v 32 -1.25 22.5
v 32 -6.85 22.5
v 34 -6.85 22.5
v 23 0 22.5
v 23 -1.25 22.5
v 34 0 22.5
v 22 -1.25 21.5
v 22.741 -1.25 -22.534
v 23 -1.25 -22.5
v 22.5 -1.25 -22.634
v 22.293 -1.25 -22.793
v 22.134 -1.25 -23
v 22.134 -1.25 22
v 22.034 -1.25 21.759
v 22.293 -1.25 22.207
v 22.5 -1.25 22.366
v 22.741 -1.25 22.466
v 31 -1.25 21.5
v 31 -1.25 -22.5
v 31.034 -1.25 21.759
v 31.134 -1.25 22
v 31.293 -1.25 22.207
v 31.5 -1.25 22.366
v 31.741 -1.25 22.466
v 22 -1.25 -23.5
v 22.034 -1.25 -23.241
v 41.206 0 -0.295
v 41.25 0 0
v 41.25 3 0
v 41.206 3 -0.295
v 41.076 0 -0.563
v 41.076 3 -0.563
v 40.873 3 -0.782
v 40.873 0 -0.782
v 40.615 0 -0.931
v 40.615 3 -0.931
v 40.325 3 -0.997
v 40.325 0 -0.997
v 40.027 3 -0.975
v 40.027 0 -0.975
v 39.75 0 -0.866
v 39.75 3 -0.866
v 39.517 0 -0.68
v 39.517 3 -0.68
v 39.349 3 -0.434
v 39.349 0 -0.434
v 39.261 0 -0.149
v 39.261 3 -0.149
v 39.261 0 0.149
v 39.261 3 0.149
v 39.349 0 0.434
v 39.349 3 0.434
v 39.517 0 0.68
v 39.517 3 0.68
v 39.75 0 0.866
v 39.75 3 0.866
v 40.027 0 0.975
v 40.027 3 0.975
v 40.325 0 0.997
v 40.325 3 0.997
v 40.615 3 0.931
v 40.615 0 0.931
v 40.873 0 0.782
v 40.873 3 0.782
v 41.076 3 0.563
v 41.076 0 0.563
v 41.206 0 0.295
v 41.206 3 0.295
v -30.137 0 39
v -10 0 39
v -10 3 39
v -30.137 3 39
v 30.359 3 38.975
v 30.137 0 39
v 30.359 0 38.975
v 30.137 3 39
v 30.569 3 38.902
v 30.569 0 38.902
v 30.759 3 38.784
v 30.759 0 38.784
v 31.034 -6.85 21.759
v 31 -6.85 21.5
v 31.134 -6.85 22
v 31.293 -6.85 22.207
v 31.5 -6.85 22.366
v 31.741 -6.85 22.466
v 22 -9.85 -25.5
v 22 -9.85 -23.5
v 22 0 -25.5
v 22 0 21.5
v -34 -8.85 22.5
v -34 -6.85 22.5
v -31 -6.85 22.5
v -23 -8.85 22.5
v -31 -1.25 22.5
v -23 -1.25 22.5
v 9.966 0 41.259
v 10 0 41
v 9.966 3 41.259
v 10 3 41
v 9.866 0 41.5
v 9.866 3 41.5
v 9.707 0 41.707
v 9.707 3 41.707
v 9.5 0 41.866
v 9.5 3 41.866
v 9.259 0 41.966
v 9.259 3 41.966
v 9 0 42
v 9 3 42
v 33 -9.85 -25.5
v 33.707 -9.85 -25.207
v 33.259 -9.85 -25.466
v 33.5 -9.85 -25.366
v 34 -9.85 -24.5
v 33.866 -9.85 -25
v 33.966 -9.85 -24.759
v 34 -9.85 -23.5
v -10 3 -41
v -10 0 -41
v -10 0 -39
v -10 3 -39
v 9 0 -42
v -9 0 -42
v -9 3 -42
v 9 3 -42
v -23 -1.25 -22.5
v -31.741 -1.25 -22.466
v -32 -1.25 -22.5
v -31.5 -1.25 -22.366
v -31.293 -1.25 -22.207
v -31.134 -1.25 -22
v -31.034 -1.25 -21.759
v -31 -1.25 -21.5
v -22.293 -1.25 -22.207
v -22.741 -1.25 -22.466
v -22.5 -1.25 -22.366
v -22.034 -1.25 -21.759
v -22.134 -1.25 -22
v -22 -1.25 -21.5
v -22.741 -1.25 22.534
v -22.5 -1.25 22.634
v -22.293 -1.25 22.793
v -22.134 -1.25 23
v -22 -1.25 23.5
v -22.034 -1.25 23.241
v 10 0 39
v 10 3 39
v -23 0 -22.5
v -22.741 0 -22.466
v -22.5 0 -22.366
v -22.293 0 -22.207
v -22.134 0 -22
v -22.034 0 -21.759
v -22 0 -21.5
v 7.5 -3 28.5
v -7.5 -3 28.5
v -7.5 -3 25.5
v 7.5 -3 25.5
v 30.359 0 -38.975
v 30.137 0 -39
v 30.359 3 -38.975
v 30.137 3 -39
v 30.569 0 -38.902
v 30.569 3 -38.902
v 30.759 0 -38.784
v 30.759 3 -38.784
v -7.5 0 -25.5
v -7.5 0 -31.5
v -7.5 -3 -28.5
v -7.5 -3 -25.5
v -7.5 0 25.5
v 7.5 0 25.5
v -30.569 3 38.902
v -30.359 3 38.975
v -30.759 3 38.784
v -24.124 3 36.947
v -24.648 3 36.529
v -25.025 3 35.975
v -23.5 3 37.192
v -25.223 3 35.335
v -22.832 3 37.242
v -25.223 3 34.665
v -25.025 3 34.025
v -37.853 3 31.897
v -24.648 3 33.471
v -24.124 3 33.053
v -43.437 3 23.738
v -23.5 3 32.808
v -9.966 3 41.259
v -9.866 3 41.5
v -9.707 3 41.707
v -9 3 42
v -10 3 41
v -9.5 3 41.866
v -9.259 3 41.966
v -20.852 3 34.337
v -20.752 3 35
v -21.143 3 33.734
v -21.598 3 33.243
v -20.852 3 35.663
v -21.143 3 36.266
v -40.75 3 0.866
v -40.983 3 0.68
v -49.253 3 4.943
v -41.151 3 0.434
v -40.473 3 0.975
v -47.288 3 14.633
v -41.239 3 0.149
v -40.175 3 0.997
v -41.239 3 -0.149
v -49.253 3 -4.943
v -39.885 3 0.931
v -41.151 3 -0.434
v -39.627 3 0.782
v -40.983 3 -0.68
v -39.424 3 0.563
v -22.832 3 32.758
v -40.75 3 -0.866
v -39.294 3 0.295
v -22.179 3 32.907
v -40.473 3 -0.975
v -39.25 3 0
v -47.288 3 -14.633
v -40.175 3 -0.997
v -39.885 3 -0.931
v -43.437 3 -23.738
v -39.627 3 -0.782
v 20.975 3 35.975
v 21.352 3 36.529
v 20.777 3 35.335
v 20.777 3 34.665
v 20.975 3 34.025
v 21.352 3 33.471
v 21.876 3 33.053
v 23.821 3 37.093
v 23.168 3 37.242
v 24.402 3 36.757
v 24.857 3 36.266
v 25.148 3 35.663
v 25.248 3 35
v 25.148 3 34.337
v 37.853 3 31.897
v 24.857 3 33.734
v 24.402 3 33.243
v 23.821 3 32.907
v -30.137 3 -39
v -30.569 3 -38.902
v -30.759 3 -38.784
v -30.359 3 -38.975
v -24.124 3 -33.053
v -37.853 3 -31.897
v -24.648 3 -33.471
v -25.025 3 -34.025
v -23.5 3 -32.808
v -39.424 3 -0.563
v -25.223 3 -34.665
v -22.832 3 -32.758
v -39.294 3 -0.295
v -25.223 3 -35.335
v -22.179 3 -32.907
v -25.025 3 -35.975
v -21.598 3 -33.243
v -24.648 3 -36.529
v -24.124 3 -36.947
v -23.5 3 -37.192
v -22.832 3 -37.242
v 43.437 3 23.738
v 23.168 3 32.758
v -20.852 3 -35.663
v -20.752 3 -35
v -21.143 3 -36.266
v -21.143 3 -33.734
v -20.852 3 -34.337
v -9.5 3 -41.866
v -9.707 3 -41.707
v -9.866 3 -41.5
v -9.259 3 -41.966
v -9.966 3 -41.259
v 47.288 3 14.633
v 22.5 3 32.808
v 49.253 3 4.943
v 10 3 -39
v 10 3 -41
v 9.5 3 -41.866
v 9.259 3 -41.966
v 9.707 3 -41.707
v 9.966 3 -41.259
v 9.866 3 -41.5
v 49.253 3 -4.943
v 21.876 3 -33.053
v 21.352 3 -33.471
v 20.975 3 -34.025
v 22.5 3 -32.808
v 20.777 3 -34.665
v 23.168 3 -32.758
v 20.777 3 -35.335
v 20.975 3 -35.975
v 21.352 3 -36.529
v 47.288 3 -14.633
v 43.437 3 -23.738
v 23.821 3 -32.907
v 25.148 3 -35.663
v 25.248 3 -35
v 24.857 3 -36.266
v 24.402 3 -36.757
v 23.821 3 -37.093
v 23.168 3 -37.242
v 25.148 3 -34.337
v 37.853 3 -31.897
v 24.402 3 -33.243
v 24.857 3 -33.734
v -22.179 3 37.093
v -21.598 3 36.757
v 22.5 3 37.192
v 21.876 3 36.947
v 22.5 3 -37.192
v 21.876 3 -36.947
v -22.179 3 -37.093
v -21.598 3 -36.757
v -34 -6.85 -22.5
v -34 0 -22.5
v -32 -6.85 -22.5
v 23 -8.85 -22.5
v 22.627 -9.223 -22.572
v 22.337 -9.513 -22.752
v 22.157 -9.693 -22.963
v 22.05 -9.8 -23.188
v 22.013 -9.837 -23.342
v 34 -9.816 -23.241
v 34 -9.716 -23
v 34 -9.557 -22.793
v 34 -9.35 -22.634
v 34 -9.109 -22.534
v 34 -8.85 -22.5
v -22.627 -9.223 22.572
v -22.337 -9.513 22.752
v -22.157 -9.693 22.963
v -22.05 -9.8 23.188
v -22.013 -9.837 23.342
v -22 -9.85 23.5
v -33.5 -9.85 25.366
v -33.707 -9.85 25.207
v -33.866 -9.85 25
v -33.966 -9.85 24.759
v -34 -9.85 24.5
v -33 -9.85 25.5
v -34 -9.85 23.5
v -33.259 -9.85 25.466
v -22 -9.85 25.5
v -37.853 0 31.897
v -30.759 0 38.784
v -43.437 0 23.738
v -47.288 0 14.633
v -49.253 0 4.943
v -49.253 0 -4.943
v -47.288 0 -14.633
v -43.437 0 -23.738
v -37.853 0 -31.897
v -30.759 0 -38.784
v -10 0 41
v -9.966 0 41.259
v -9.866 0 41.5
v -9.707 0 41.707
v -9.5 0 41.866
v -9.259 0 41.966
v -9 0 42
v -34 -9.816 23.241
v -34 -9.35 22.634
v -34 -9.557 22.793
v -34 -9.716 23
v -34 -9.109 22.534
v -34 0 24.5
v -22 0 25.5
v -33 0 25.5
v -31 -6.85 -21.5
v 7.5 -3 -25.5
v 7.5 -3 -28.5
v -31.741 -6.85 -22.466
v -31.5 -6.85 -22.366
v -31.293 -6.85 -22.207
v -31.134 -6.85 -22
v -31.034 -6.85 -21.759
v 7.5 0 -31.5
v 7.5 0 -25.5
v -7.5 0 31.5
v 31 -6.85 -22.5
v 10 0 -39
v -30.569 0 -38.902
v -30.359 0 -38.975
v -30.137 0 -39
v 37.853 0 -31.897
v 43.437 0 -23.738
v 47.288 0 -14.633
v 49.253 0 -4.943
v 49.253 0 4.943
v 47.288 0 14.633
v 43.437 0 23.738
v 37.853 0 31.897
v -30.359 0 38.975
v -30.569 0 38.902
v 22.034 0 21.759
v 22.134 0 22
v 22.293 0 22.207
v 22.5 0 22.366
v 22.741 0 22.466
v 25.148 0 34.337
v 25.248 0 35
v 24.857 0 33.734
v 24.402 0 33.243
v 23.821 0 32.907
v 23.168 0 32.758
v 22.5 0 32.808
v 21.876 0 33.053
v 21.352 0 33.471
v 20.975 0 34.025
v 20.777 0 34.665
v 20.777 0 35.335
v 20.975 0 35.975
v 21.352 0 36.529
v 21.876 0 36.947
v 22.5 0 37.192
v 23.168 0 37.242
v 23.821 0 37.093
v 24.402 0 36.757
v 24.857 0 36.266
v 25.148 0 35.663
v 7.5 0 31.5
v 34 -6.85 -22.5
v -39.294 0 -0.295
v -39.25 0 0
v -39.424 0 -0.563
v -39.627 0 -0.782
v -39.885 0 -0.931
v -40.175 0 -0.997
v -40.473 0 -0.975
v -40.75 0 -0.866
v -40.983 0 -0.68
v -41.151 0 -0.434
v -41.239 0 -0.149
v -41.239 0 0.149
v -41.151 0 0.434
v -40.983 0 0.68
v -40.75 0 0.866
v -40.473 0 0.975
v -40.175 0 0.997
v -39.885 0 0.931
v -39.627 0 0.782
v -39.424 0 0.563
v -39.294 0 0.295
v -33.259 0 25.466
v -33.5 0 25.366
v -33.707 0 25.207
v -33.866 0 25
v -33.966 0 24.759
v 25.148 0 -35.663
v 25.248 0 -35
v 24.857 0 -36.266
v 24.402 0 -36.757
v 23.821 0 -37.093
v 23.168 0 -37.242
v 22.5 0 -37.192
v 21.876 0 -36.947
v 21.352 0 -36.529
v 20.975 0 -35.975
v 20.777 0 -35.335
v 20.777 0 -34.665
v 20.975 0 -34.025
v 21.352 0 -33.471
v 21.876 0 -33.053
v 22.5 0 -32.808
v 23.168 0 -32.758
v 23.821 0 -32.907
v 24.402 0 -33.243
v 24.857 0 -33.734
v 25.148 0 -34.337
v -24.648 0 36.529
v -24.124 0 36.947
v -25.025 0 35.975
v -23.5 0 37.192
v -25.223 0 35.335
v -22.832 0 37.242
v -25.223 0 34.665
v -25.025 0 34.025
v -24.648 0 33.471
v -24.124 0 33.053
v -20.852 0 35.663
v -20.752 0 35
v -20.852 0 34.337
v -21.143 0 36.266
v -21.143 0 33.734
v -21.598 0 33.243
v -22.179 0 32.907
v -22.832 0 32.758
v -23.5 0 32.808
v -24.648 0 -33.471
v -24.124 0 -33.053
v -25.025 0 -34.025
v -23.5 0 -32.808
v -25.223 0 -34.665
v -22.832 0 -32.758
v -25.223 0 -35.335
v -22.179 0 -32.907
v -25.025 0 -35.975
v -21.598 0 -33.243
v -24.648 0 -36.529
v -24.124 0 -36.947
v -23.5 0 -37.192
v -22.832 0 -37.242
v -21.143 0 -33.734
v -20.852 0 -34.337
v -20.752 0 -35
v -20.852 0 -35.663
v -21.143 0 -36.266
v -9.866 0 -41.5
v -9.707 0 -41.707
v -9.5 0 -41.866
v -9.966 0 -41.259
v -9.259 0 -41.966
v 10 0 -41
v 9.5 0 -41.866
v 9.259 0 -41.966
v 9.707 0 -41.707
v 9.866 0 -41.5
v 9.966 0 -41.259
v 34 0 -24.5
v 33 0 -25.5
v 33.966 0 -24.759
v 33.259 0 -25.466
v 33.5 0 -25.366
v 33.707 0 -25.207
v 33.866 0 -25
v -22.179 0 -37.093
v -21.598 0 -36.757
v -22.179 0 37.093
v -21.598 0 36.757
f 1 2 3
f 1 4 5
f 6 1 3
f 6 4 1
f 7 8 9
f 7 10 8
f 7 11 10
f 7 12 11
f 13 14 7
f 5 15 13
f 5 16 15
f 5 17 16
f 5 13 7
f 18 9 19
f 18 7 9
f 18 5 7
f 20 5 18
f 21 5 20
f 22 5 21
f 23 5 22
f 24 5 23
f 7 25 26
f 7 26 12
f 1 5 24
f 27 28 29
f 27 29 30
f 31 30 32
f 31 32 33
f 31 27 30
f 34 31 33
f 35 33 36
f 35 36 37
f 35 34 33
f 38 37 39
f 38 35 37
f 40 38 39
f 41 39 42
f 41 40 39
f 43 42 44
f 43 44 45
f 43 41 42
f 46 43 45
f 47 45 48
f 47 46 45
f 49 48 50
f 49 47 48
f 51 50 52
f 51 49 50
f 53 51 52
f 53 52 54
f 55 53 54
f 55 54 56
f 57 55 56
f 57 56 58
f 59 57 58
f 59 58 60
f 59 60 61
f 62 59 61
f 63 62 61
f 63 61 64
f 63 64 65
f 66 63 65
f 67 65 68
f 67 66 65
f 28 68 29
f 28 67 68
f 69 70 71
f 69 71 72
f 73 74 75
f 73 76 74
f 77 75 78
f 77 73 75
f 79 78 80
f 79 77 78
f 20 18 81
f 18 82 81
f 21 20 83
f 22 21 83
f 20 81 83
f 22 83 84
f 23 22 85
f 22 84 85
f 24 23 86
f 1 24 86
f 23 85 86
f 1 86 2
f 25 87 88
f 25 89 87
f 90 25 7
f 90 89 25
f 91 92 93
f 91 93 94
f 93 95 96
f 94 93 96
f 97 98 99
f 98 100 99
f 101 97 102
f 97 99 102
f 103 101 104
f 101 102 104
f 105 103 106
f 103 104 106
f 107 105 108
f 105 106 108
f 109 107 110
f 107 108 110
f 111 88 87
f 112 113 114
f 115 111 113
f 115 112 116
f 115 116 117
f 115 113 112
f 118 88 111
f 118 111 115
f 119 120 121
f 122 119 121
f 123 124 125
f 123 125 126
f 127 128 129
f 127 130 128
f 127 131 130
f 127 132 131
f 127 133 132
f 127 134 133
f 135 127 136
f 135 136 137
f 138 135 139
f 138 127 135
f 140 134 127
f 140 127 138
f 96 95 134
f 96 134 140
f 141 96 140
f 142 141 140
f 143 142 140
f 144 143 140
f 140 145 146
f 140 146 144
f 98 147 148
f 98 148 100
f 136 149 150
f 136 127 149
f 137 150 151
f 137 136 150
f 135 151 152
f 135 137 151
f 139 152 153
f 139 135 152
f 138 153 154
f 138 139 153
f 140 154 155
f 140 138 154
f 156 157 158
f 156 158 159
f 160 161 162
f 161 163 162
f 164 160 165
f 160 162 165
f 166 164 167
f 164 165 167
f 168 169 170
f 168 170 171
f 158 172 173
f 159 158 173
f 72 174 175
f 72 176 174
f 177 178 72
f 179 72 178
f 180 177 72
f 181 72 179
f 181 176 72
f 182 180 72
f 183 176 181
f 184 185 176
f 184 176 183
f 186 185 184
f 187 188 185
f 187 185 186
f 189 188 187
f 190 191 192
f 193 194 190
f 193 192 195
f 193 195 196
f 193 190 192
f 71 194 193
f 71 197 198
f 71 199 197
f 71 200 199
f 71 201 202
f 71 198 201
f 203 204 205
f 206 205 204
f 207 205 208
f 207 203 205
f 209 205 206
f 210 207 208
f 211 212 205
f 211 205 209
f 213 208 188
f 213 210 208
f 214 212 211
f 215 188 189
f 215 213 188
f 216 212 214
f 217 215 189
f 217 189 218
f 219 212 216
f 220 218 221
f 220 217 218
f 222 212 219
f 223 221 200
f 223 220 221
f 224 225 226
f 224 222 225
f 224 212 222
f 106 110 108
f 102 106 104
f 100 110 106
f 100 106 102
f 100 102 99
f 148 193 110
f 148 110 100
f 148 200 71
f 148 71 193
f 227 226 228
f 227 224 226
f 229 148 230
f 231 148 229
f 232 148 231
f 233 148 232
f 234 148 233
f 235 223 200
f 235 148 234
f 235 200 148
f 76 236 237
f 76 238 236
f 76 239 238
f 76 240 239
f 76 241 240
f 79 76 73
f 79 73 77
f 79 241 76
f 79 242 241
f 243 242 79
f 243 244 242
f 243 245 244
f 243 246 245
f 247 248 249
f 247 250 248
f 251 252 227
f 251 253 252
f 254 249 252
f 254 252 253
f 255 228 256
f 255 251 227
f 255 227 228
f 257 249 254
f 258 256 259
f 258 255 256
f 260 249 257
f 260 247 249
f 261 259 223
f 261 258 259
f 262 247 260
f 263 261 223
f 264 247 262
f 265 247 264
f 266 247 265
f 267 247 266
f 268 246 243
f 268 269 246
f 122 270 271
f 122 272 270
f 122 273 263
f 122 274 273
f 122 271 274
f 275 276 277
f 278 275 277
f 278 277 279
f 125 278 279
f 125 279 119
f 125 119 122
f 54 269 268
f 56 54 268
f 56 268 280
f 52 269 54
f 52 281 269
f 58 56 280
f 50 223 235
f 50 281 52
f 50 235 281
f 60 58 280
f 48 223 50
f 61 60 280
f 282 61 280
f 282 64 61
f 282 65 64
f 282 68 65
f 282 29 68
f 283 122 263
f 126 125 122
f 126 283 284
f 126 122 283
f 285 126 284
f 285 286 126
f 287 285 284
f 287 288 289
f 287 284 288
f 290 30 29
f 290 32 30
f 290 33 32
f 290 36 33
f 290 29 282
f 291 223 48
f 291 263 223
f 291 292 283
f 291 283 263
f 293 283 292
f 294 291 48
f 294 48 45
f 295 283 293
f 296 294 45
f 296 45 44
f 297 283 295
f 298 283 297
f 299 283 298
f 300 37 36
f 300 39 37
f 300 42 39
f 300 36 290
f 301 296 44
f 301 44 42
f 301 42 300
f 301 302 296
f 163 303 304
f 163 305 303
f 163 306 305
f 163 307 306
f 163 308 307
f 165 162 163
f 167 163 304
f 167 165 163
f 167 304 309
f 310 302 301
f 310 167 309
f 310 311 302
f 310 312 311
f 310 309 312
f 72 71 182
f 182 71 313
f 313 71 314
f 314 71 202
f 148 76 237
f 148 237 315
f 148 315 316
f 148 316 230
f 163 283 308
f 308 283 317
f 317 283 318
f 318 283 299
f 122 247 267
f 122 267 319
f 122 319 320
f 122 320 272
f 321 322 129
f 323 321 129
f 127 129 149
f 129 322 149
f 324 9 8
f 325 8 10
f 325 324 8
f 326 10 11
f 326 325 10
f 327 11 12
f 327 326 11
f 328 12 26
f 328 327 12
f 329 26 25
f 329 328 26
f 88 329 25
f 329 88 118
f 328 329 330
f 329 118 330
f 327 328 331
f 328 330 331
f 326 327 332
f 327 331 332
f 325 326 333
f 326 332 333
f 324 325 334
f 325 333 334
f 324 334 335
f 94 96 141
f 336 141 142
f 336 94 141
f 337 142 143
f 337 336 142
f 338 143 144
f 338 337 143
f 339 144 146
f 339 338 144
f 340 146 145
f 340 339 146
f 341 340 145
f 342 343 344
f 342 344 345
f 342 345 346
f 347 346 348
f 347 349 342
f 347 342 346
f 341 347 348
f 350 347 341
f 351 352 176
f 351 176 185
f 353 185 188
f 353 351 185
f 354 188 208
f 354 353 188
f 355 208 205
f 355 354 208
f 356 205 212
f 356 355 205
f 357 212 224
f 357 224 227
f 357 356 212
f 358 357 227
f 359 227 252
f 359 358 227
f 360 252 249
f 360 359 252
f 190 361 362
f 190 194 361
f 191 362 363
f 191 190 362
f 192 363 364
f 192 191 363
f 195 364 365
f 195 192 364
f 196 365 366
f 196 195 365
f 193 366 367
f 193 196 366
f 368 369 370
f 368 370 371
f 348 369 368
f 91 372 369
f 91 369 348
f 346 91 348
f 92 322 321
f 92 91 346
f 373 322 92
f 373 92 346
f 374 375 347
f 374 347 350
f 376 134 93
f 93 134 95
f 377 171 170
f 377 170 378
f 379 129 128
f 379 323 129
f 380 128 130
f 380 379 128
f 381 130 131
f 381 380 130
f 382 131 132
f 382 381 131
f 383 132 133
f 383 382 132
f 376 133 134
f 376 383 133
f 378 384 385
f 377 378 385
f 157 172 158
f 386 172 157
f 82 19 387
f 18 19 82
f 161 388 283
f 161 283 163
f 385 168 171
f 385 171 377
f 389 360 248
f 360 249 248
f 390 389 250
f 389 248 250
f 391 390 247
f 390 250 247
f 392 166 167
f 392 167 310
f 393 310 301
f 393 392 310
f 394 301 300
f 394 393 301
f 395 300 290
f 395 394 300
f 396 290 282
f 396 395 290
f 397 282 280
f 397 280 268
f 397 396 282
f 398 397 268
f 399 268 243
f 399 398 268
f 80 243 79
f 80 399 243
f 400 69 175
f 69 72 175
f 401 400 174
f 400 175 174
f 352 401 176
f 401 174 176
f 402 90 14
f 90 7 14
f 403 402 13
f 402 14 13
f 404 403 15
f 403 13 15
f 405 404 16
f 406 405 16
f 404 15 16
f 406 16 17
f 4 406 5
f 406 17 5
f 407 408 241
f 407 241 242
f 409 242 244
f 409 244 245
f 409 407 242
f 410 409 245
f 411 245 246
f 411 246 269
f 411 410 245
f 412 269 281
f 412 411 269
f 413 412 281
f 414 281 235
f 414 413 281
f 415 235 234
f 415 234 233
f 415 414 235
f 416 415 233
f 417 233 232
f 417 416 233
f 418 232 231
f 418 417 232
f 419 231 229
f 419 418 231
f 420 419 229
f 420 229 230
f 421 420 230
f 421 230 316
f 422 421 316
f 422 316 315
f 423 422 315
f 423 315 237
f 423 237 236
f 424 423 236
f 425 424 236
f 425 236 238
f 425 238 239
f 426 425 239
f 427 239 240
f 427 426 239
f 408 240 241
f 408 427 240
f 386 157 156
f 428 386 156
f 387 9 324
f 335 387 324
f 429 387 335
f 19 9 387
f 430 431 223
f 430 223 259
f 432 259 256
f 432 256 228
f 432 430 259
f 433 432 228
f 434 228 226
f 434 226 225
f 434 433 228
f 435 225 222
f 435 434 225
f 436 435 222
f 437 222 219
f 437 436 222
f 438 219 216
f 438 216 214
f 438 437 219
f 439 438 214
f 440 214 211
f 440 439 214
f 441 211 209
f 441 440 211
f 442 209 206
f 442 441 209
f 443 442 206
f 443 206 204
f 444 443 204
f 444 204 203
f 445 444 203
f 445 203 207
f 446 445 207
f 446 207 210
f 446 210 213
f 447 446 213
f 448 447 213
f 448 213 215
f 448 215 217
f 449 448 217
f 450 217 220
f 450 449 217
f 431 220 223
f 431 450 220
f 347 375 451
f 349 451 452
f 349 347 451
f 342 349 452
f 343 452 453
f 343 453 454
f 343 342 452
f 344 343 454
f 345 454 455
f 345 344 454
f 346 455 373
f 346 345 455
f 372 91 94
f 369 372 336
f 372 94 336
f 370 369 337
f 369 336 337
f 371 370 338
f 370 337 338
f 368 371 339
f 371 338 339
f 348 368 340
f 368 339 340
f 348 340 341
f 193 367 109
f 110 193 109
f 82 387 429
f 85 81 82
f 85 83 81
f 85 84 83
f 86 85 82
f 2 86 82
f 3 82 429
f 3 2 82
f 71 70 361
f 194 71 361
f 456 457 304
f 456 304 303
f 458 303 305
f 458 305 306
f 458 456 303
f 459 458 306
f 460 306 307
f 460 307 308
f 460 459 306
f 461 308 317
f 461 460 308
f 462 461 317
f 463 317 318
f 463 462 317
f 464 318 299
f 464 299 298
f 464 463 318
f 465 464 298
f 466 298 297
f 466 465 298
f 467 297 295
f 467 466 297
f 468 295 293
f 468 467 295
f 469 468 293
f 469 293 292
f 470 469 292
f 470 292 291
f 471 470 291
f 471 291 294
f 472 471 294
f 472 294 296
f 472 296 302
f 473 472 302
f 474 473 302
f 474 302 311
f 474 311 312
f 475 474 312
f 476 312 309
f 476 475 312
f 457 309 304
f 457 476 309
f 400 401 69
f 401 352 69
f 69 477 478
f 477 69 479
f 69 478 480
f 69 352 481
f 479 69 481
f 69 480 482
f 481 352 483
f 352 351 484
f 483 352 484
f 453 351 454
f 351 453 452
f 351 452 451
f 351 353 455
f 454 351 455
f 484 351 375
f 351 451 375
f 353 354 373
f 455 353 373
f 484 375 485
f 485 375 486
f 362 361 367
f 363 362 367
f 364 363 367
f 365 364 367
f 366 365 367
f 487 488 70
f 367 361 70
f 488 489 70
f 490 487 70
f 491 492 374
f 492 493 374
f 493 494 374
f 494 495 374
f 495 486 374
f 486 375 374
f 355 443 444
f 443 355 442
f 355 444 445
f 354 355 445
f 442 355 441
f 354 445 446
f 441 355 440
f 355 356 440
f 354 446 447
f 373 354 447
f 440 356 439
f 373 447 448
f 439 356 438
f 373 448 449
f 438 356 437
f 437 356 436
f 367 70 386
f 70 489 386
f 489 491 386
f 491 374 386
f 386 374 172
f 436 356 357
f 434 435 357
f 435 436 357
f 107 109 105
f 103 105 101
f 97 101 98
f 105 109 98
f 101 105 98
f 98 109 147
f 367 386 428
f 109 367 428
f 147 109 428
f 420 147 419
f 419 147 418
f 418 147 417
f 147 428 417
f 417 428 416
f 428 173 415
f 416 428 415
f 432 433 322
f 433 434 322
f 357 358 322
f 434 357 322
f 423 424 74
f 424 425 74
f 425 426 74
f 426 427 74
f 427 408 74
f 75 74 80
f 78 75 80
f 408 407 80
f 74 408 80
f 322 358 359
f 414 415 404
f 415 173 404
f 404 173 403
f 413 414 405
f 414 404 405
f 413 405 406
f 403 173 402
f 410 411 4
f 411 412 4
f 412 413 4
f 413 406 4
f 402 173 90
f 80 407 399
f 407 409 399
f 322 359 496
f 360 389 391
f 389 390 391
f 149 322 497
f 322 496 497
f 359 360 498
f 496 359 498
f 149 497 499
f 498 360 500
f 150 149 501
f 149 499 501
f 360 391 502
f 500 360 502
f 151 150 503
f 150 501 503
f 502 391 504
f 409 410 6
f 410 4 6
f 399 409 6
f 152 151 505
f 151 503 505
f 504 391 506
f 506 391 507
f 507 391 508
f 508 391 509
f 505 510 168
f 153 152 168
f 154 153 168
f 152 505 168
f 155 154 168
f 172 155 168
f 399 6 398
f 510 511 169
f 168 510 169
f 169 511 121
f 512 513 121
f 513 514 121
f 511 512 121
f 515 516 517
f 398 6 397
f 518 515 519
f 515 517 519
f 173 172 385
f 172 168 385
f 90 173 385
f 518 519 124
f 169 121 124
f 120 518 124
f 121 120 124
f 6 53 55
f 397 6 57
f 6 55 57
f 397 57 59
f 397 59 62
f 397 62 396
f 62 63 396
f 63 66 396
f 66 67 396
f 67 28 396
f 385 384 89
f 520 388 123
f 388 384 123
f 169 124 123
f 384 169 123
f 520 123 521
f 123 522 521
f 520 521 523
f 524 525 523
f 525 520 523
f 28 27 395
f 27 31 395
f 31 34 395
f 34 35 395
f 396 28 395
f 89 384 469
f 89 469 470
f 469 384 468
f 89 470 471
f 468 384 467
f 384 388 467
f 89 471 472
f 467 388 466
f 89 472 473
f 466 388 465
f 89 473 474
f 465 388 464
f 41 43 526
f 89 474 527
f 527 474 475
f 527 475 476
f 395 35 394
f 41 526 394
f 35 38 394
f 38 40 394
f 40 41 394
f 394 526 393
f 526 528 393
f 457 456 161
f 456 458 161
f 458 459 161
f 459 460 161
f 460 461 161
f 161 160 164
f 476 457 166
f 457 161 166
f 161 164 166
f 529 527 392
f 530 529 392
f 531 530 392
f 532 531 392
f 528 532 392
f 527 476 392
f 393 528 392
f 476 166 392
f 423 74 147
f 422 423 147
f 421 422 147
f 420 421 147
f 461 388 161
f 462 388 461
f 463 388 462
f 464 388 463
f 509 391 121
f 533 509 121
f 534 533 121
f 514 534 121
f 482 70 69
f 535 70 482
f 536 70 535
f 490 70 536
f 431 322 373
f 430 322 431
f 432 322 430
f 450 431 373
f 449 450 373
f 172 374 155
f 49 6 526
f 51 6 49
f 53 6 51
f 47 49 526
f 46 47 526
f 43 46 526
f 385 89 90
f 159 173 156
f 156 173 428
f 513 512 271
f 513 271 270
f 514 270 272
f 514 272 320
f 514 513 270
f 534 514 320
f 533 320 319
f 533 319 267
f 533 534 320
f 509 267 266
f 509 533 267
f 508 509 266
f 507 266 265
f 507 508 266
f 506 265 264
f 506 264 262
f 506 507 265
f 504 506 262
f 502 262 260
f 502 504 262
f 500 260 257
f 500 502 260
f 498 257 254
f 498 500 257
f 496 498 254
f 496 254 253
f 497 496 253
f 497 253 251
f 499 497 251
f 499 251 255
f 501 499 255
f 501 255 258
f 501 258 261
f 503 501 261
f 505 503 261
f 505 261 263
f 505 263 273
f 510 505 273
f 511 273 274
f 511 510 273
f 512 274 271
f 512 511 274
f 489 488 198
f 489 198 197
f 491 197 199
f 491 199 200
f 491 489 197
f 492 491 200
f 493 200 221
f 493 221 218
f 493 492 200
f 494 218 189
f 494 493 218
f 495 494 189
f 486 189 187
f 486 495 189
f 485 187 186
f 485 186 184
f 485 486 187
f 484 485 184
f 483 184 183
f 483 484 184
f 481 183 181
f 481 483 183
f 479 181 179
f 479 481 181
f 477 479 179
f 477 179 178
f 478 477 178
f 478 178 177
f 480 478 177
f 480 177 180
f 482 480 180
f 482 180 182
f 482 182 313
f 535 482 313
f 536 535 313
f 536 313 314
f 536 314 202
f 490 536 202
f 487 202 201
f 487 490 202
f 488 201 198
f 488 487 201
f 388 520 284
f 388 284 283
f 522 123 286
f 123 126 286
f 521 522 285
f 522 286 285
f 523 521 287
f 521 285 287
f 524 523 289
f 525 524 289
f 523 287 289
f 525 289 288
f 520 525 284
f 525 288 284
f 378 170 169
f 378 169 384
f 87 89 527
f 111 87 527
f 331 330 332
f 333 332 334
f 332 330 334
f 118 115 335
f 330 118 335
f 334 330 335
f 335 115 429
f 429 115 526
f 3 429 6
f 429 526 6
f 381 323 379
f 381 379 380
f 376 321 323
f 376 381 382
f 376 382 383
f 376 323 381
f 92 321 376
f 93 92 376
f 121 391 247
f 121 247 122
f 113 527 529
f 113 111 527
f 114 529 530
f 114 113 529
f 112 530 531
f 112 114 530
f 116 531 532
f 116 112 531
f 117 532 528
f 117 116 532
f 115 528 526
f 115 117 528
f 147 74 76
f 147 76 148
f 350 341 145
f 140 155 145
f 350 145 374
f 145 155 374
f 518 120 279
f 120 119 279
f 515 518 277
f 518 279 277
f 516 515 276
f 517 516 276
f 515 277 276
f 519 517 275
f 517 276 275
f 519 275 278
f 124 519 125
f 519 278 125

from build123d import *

# Parameters (mm, degrees)
A_BASE_T42_OUTLINE_R              = 2.2479
A_BASE_T42_OUTLINE_R_2            = 1
A_BASE_T42_DEPTH                  = 3
OUTER_RIM_CUT_DEPTH               = 68.299702823
SKETCH2_W                         = 20
SKETCH2_H                         = 3
FLANGES_DEPTH                     = 3
CONTOURING_R                      = 1
SKETCH3_W                         = 15
SKETCH3_H                         = 3
BASE_SUPPORTS_DEPTH               = 3
BASE_SUPPORTS_CHAMFER_SIZE        = 3
SKETCH4_W                         = 3
SKETCH4_H                         = 45
DYNAMIXEL_SIDE_SUPPORTS_DEPTH     = 6.85
SKETCH5_W                         = 12
SKETCH5_H                         = 3
DYNAMIXEL_SIDE_SUPPORT_ENDS_DEPTH = 9.85
SKETCH8_W                         = 9
SKETCH8_H                         = 45
DYNAMIXEL_OFFSET_DEPTH            = 1.25
DYNAMIXEL_CONTOURING_R            = 1


# Read off the part's stored shape, not the designer's step: a_base_t42
with BuildPart() as part:
    # a_base_t42 outline → a_base_t42 (new body)
    with BuildSketch(Plane(origin=(0, 0, 0), x_dir=(1, 0, 0), z_dir=(0, 1, 0))):
        with BuildLine():
            ThreePointArc((31.5, -42), (52.5, 0), (31.5, 42))
            Line((31.5, 42), (-31.5, 42))
            ThreePointArc((-31.5, 42), (-52.5, 0), (-31.5, -42))
            Line((-31.5, -42), (31.5, -42))
        make_face()
        with Locations((-23, -35)):
            Circle(A_BASE_T42_OUTLINE_R, mode=Mode.SUBTRACT)
        with Locations((23, -35)):
            Circle(A_BASE_T42_OUTLINE_R, mode=Mode.SUBTRACT)
        with Locations((-40.25, 0)):
            Circle(A_BASE_T42_OUTLINE_R_2, mode=Mode.SUBTRACT)
        with Locations((-23, 35)):
            Circle(A_BASE_T42_OUTLINE_R, mode=Mode.SUBTRACT)
        with Locations((40.25, 0)):
            Circle(A_BASE_T42_OUTLINE_R_2, mode=Mode.SUBTRACT)
        with Locations((23, 35)):
            Circle(A_BASE_T42_OUTLINE_R, mode=Mode.SUBTRACT)
    extrude(amount=A_BASE_T42_DEPTH)

    # Sketch1 → Outer Rim Cut (cut, through all)
    with BuildSketch(Plane.XZ):
        with BuildLine():
            Line((31.5, 42), (-31.5, 42))
            ThreePointArc((-31.5, 42), (-52.5, 0), (-31.5, -42))
            Line((-31.5, -42), (31.5, -42))
            ThreePointArc((31.5, -42), (52.5, 0), (31.5, 42))
        make_face()
        with BuildLine():
            Line((30.483602149, 39), (-30.483602149, 39))
            ThreePointArc((-30.483602149, 39), (-49.5, 0), (-30.483602149, -39))
            Line((-30.483602149, -39), (30.483602149, -39))
            ThreePointArc((30.483602149, -39), (49.5, 0), (30.483602149, 39))
        make_face(mode=Mode.SUBTRACT)
    extrude(amount=-OUTER_RIM_CUT_DEPTH, mode=Mode.SUBTRACT)

    # Sketch2 → Flanges (add)
    with BuildSketch(Plane.XZ):
        with Locations((0, -40.5)):
            Rectangle(SKETCH2_W, SKETCH2_H)
        with Locations((0, 40.5)):
            Rectangle(SKETCH2_W, SKETCH2_H)
    extrude(amount=-FLANGES_DEPTH)

    # Contouring
    contouring_edges = [part.edges().sort_by_distance(p)[0] for p in [
        (30.483602149, 1.5, -39),
        (-30.483602149, 1.5, -39),
        (10, 1.5, -42),
        (-10, 1.5, -42),
        (30.483602149, 1.5, 39),
        (-30.483602149, 1.5, 39),
        (10, 1.5, 42),
        (-10, 1.5, 42),
    ]]
    fillet(contouring_edges, radius=CONTOURING_R)

    # Sketch3 → Base Supports (add)
    with BuildSketch(Plane.XZ):
        with Locations((0, -27)):
            Rectangle(SKETCH3_W, SKETCH3_H)
        with Locations((0, 27)):
            Rectangle(SKETCH3_W, SKETCH3_H)
    extrude(amount=BASE_SUPPORTS_DEPTH)

    # Base Supports Chamfer
    base_supports_chamfer_edges = [part.edges().sort_by_distance(p)[0] for p in [
        (0, 0, 28.5),
        (0, 0, -28.5),
    ]]
    chamfer(base_supports_chamfer_edges, length=BASE_SUPPORTS_CHAMFER_SIZE - 0.0001)  # a hair under: the kernel refuses the full size

    # Sketch4 → Dynamixel Side Supports (add)
    with BuildSketch(Plane.XZ):
        with Locations((-32.5, 0)):
            Rectangle(SKETCH4_W, SKETCH4_H)
        with Locations((32.5, 0)):
            Rectangle(SKETCH4_W, SKETCH4_H)
    extrude(amount=DYNAMIXEL_SIDE_SUPPORTS_DEPTH)

    # Sketch5 → Dynamixel Side Support Ends (add)
    with BuildSketch(Plane.XZ):
        with Locations((-28, 24)):
            Rectangle(SKETCH5_W, SKETCH5_H)
        with Locations((28, -24)):
            Rectangle(SKETCH5_W, SKETCH5_H)
    extrude(amount=DYNAMIXEL_SIDE_SUPPORT_ENDS_DEPTH)

    # Sketch8 → Dynamixel Offset (add)
    with BuildSketch(Plane.XZ):
        with Locations((-26.5, 0)):
            Rectangle(SKETCH8_W, SKETCH8_H)
        with Locations((26.5, 0)):
            Rectangle(SKETCH8_W, SKETCH8_H)
    extrude(amount=DYNAMIXEL_OFFSET_DEPTH)

    # Dynamixel Contouring
    dynamixel_contouring_edges = [part.edges().sort_by_distance(p)[0] for p in [
        (-31, -4.05, -22.5),
        (31, -4.05, 22.5),
        (-34, -4.925, 25.5),
        (-22, -5.55, 22.5),
        (-28, -9.85, 22.5),
        (34, -4.925, -25.5),
        (22, -5.55, -22.5),
        (28, -9.85, -22.5),
        (-22, -0.625, -22.5),
        (22, -0.625, 22.5),
    ]]
    fillet(dynamixel_contouring_edges, radius=DYNAMIXEL_CONTOURING_R)


solid = part.part
